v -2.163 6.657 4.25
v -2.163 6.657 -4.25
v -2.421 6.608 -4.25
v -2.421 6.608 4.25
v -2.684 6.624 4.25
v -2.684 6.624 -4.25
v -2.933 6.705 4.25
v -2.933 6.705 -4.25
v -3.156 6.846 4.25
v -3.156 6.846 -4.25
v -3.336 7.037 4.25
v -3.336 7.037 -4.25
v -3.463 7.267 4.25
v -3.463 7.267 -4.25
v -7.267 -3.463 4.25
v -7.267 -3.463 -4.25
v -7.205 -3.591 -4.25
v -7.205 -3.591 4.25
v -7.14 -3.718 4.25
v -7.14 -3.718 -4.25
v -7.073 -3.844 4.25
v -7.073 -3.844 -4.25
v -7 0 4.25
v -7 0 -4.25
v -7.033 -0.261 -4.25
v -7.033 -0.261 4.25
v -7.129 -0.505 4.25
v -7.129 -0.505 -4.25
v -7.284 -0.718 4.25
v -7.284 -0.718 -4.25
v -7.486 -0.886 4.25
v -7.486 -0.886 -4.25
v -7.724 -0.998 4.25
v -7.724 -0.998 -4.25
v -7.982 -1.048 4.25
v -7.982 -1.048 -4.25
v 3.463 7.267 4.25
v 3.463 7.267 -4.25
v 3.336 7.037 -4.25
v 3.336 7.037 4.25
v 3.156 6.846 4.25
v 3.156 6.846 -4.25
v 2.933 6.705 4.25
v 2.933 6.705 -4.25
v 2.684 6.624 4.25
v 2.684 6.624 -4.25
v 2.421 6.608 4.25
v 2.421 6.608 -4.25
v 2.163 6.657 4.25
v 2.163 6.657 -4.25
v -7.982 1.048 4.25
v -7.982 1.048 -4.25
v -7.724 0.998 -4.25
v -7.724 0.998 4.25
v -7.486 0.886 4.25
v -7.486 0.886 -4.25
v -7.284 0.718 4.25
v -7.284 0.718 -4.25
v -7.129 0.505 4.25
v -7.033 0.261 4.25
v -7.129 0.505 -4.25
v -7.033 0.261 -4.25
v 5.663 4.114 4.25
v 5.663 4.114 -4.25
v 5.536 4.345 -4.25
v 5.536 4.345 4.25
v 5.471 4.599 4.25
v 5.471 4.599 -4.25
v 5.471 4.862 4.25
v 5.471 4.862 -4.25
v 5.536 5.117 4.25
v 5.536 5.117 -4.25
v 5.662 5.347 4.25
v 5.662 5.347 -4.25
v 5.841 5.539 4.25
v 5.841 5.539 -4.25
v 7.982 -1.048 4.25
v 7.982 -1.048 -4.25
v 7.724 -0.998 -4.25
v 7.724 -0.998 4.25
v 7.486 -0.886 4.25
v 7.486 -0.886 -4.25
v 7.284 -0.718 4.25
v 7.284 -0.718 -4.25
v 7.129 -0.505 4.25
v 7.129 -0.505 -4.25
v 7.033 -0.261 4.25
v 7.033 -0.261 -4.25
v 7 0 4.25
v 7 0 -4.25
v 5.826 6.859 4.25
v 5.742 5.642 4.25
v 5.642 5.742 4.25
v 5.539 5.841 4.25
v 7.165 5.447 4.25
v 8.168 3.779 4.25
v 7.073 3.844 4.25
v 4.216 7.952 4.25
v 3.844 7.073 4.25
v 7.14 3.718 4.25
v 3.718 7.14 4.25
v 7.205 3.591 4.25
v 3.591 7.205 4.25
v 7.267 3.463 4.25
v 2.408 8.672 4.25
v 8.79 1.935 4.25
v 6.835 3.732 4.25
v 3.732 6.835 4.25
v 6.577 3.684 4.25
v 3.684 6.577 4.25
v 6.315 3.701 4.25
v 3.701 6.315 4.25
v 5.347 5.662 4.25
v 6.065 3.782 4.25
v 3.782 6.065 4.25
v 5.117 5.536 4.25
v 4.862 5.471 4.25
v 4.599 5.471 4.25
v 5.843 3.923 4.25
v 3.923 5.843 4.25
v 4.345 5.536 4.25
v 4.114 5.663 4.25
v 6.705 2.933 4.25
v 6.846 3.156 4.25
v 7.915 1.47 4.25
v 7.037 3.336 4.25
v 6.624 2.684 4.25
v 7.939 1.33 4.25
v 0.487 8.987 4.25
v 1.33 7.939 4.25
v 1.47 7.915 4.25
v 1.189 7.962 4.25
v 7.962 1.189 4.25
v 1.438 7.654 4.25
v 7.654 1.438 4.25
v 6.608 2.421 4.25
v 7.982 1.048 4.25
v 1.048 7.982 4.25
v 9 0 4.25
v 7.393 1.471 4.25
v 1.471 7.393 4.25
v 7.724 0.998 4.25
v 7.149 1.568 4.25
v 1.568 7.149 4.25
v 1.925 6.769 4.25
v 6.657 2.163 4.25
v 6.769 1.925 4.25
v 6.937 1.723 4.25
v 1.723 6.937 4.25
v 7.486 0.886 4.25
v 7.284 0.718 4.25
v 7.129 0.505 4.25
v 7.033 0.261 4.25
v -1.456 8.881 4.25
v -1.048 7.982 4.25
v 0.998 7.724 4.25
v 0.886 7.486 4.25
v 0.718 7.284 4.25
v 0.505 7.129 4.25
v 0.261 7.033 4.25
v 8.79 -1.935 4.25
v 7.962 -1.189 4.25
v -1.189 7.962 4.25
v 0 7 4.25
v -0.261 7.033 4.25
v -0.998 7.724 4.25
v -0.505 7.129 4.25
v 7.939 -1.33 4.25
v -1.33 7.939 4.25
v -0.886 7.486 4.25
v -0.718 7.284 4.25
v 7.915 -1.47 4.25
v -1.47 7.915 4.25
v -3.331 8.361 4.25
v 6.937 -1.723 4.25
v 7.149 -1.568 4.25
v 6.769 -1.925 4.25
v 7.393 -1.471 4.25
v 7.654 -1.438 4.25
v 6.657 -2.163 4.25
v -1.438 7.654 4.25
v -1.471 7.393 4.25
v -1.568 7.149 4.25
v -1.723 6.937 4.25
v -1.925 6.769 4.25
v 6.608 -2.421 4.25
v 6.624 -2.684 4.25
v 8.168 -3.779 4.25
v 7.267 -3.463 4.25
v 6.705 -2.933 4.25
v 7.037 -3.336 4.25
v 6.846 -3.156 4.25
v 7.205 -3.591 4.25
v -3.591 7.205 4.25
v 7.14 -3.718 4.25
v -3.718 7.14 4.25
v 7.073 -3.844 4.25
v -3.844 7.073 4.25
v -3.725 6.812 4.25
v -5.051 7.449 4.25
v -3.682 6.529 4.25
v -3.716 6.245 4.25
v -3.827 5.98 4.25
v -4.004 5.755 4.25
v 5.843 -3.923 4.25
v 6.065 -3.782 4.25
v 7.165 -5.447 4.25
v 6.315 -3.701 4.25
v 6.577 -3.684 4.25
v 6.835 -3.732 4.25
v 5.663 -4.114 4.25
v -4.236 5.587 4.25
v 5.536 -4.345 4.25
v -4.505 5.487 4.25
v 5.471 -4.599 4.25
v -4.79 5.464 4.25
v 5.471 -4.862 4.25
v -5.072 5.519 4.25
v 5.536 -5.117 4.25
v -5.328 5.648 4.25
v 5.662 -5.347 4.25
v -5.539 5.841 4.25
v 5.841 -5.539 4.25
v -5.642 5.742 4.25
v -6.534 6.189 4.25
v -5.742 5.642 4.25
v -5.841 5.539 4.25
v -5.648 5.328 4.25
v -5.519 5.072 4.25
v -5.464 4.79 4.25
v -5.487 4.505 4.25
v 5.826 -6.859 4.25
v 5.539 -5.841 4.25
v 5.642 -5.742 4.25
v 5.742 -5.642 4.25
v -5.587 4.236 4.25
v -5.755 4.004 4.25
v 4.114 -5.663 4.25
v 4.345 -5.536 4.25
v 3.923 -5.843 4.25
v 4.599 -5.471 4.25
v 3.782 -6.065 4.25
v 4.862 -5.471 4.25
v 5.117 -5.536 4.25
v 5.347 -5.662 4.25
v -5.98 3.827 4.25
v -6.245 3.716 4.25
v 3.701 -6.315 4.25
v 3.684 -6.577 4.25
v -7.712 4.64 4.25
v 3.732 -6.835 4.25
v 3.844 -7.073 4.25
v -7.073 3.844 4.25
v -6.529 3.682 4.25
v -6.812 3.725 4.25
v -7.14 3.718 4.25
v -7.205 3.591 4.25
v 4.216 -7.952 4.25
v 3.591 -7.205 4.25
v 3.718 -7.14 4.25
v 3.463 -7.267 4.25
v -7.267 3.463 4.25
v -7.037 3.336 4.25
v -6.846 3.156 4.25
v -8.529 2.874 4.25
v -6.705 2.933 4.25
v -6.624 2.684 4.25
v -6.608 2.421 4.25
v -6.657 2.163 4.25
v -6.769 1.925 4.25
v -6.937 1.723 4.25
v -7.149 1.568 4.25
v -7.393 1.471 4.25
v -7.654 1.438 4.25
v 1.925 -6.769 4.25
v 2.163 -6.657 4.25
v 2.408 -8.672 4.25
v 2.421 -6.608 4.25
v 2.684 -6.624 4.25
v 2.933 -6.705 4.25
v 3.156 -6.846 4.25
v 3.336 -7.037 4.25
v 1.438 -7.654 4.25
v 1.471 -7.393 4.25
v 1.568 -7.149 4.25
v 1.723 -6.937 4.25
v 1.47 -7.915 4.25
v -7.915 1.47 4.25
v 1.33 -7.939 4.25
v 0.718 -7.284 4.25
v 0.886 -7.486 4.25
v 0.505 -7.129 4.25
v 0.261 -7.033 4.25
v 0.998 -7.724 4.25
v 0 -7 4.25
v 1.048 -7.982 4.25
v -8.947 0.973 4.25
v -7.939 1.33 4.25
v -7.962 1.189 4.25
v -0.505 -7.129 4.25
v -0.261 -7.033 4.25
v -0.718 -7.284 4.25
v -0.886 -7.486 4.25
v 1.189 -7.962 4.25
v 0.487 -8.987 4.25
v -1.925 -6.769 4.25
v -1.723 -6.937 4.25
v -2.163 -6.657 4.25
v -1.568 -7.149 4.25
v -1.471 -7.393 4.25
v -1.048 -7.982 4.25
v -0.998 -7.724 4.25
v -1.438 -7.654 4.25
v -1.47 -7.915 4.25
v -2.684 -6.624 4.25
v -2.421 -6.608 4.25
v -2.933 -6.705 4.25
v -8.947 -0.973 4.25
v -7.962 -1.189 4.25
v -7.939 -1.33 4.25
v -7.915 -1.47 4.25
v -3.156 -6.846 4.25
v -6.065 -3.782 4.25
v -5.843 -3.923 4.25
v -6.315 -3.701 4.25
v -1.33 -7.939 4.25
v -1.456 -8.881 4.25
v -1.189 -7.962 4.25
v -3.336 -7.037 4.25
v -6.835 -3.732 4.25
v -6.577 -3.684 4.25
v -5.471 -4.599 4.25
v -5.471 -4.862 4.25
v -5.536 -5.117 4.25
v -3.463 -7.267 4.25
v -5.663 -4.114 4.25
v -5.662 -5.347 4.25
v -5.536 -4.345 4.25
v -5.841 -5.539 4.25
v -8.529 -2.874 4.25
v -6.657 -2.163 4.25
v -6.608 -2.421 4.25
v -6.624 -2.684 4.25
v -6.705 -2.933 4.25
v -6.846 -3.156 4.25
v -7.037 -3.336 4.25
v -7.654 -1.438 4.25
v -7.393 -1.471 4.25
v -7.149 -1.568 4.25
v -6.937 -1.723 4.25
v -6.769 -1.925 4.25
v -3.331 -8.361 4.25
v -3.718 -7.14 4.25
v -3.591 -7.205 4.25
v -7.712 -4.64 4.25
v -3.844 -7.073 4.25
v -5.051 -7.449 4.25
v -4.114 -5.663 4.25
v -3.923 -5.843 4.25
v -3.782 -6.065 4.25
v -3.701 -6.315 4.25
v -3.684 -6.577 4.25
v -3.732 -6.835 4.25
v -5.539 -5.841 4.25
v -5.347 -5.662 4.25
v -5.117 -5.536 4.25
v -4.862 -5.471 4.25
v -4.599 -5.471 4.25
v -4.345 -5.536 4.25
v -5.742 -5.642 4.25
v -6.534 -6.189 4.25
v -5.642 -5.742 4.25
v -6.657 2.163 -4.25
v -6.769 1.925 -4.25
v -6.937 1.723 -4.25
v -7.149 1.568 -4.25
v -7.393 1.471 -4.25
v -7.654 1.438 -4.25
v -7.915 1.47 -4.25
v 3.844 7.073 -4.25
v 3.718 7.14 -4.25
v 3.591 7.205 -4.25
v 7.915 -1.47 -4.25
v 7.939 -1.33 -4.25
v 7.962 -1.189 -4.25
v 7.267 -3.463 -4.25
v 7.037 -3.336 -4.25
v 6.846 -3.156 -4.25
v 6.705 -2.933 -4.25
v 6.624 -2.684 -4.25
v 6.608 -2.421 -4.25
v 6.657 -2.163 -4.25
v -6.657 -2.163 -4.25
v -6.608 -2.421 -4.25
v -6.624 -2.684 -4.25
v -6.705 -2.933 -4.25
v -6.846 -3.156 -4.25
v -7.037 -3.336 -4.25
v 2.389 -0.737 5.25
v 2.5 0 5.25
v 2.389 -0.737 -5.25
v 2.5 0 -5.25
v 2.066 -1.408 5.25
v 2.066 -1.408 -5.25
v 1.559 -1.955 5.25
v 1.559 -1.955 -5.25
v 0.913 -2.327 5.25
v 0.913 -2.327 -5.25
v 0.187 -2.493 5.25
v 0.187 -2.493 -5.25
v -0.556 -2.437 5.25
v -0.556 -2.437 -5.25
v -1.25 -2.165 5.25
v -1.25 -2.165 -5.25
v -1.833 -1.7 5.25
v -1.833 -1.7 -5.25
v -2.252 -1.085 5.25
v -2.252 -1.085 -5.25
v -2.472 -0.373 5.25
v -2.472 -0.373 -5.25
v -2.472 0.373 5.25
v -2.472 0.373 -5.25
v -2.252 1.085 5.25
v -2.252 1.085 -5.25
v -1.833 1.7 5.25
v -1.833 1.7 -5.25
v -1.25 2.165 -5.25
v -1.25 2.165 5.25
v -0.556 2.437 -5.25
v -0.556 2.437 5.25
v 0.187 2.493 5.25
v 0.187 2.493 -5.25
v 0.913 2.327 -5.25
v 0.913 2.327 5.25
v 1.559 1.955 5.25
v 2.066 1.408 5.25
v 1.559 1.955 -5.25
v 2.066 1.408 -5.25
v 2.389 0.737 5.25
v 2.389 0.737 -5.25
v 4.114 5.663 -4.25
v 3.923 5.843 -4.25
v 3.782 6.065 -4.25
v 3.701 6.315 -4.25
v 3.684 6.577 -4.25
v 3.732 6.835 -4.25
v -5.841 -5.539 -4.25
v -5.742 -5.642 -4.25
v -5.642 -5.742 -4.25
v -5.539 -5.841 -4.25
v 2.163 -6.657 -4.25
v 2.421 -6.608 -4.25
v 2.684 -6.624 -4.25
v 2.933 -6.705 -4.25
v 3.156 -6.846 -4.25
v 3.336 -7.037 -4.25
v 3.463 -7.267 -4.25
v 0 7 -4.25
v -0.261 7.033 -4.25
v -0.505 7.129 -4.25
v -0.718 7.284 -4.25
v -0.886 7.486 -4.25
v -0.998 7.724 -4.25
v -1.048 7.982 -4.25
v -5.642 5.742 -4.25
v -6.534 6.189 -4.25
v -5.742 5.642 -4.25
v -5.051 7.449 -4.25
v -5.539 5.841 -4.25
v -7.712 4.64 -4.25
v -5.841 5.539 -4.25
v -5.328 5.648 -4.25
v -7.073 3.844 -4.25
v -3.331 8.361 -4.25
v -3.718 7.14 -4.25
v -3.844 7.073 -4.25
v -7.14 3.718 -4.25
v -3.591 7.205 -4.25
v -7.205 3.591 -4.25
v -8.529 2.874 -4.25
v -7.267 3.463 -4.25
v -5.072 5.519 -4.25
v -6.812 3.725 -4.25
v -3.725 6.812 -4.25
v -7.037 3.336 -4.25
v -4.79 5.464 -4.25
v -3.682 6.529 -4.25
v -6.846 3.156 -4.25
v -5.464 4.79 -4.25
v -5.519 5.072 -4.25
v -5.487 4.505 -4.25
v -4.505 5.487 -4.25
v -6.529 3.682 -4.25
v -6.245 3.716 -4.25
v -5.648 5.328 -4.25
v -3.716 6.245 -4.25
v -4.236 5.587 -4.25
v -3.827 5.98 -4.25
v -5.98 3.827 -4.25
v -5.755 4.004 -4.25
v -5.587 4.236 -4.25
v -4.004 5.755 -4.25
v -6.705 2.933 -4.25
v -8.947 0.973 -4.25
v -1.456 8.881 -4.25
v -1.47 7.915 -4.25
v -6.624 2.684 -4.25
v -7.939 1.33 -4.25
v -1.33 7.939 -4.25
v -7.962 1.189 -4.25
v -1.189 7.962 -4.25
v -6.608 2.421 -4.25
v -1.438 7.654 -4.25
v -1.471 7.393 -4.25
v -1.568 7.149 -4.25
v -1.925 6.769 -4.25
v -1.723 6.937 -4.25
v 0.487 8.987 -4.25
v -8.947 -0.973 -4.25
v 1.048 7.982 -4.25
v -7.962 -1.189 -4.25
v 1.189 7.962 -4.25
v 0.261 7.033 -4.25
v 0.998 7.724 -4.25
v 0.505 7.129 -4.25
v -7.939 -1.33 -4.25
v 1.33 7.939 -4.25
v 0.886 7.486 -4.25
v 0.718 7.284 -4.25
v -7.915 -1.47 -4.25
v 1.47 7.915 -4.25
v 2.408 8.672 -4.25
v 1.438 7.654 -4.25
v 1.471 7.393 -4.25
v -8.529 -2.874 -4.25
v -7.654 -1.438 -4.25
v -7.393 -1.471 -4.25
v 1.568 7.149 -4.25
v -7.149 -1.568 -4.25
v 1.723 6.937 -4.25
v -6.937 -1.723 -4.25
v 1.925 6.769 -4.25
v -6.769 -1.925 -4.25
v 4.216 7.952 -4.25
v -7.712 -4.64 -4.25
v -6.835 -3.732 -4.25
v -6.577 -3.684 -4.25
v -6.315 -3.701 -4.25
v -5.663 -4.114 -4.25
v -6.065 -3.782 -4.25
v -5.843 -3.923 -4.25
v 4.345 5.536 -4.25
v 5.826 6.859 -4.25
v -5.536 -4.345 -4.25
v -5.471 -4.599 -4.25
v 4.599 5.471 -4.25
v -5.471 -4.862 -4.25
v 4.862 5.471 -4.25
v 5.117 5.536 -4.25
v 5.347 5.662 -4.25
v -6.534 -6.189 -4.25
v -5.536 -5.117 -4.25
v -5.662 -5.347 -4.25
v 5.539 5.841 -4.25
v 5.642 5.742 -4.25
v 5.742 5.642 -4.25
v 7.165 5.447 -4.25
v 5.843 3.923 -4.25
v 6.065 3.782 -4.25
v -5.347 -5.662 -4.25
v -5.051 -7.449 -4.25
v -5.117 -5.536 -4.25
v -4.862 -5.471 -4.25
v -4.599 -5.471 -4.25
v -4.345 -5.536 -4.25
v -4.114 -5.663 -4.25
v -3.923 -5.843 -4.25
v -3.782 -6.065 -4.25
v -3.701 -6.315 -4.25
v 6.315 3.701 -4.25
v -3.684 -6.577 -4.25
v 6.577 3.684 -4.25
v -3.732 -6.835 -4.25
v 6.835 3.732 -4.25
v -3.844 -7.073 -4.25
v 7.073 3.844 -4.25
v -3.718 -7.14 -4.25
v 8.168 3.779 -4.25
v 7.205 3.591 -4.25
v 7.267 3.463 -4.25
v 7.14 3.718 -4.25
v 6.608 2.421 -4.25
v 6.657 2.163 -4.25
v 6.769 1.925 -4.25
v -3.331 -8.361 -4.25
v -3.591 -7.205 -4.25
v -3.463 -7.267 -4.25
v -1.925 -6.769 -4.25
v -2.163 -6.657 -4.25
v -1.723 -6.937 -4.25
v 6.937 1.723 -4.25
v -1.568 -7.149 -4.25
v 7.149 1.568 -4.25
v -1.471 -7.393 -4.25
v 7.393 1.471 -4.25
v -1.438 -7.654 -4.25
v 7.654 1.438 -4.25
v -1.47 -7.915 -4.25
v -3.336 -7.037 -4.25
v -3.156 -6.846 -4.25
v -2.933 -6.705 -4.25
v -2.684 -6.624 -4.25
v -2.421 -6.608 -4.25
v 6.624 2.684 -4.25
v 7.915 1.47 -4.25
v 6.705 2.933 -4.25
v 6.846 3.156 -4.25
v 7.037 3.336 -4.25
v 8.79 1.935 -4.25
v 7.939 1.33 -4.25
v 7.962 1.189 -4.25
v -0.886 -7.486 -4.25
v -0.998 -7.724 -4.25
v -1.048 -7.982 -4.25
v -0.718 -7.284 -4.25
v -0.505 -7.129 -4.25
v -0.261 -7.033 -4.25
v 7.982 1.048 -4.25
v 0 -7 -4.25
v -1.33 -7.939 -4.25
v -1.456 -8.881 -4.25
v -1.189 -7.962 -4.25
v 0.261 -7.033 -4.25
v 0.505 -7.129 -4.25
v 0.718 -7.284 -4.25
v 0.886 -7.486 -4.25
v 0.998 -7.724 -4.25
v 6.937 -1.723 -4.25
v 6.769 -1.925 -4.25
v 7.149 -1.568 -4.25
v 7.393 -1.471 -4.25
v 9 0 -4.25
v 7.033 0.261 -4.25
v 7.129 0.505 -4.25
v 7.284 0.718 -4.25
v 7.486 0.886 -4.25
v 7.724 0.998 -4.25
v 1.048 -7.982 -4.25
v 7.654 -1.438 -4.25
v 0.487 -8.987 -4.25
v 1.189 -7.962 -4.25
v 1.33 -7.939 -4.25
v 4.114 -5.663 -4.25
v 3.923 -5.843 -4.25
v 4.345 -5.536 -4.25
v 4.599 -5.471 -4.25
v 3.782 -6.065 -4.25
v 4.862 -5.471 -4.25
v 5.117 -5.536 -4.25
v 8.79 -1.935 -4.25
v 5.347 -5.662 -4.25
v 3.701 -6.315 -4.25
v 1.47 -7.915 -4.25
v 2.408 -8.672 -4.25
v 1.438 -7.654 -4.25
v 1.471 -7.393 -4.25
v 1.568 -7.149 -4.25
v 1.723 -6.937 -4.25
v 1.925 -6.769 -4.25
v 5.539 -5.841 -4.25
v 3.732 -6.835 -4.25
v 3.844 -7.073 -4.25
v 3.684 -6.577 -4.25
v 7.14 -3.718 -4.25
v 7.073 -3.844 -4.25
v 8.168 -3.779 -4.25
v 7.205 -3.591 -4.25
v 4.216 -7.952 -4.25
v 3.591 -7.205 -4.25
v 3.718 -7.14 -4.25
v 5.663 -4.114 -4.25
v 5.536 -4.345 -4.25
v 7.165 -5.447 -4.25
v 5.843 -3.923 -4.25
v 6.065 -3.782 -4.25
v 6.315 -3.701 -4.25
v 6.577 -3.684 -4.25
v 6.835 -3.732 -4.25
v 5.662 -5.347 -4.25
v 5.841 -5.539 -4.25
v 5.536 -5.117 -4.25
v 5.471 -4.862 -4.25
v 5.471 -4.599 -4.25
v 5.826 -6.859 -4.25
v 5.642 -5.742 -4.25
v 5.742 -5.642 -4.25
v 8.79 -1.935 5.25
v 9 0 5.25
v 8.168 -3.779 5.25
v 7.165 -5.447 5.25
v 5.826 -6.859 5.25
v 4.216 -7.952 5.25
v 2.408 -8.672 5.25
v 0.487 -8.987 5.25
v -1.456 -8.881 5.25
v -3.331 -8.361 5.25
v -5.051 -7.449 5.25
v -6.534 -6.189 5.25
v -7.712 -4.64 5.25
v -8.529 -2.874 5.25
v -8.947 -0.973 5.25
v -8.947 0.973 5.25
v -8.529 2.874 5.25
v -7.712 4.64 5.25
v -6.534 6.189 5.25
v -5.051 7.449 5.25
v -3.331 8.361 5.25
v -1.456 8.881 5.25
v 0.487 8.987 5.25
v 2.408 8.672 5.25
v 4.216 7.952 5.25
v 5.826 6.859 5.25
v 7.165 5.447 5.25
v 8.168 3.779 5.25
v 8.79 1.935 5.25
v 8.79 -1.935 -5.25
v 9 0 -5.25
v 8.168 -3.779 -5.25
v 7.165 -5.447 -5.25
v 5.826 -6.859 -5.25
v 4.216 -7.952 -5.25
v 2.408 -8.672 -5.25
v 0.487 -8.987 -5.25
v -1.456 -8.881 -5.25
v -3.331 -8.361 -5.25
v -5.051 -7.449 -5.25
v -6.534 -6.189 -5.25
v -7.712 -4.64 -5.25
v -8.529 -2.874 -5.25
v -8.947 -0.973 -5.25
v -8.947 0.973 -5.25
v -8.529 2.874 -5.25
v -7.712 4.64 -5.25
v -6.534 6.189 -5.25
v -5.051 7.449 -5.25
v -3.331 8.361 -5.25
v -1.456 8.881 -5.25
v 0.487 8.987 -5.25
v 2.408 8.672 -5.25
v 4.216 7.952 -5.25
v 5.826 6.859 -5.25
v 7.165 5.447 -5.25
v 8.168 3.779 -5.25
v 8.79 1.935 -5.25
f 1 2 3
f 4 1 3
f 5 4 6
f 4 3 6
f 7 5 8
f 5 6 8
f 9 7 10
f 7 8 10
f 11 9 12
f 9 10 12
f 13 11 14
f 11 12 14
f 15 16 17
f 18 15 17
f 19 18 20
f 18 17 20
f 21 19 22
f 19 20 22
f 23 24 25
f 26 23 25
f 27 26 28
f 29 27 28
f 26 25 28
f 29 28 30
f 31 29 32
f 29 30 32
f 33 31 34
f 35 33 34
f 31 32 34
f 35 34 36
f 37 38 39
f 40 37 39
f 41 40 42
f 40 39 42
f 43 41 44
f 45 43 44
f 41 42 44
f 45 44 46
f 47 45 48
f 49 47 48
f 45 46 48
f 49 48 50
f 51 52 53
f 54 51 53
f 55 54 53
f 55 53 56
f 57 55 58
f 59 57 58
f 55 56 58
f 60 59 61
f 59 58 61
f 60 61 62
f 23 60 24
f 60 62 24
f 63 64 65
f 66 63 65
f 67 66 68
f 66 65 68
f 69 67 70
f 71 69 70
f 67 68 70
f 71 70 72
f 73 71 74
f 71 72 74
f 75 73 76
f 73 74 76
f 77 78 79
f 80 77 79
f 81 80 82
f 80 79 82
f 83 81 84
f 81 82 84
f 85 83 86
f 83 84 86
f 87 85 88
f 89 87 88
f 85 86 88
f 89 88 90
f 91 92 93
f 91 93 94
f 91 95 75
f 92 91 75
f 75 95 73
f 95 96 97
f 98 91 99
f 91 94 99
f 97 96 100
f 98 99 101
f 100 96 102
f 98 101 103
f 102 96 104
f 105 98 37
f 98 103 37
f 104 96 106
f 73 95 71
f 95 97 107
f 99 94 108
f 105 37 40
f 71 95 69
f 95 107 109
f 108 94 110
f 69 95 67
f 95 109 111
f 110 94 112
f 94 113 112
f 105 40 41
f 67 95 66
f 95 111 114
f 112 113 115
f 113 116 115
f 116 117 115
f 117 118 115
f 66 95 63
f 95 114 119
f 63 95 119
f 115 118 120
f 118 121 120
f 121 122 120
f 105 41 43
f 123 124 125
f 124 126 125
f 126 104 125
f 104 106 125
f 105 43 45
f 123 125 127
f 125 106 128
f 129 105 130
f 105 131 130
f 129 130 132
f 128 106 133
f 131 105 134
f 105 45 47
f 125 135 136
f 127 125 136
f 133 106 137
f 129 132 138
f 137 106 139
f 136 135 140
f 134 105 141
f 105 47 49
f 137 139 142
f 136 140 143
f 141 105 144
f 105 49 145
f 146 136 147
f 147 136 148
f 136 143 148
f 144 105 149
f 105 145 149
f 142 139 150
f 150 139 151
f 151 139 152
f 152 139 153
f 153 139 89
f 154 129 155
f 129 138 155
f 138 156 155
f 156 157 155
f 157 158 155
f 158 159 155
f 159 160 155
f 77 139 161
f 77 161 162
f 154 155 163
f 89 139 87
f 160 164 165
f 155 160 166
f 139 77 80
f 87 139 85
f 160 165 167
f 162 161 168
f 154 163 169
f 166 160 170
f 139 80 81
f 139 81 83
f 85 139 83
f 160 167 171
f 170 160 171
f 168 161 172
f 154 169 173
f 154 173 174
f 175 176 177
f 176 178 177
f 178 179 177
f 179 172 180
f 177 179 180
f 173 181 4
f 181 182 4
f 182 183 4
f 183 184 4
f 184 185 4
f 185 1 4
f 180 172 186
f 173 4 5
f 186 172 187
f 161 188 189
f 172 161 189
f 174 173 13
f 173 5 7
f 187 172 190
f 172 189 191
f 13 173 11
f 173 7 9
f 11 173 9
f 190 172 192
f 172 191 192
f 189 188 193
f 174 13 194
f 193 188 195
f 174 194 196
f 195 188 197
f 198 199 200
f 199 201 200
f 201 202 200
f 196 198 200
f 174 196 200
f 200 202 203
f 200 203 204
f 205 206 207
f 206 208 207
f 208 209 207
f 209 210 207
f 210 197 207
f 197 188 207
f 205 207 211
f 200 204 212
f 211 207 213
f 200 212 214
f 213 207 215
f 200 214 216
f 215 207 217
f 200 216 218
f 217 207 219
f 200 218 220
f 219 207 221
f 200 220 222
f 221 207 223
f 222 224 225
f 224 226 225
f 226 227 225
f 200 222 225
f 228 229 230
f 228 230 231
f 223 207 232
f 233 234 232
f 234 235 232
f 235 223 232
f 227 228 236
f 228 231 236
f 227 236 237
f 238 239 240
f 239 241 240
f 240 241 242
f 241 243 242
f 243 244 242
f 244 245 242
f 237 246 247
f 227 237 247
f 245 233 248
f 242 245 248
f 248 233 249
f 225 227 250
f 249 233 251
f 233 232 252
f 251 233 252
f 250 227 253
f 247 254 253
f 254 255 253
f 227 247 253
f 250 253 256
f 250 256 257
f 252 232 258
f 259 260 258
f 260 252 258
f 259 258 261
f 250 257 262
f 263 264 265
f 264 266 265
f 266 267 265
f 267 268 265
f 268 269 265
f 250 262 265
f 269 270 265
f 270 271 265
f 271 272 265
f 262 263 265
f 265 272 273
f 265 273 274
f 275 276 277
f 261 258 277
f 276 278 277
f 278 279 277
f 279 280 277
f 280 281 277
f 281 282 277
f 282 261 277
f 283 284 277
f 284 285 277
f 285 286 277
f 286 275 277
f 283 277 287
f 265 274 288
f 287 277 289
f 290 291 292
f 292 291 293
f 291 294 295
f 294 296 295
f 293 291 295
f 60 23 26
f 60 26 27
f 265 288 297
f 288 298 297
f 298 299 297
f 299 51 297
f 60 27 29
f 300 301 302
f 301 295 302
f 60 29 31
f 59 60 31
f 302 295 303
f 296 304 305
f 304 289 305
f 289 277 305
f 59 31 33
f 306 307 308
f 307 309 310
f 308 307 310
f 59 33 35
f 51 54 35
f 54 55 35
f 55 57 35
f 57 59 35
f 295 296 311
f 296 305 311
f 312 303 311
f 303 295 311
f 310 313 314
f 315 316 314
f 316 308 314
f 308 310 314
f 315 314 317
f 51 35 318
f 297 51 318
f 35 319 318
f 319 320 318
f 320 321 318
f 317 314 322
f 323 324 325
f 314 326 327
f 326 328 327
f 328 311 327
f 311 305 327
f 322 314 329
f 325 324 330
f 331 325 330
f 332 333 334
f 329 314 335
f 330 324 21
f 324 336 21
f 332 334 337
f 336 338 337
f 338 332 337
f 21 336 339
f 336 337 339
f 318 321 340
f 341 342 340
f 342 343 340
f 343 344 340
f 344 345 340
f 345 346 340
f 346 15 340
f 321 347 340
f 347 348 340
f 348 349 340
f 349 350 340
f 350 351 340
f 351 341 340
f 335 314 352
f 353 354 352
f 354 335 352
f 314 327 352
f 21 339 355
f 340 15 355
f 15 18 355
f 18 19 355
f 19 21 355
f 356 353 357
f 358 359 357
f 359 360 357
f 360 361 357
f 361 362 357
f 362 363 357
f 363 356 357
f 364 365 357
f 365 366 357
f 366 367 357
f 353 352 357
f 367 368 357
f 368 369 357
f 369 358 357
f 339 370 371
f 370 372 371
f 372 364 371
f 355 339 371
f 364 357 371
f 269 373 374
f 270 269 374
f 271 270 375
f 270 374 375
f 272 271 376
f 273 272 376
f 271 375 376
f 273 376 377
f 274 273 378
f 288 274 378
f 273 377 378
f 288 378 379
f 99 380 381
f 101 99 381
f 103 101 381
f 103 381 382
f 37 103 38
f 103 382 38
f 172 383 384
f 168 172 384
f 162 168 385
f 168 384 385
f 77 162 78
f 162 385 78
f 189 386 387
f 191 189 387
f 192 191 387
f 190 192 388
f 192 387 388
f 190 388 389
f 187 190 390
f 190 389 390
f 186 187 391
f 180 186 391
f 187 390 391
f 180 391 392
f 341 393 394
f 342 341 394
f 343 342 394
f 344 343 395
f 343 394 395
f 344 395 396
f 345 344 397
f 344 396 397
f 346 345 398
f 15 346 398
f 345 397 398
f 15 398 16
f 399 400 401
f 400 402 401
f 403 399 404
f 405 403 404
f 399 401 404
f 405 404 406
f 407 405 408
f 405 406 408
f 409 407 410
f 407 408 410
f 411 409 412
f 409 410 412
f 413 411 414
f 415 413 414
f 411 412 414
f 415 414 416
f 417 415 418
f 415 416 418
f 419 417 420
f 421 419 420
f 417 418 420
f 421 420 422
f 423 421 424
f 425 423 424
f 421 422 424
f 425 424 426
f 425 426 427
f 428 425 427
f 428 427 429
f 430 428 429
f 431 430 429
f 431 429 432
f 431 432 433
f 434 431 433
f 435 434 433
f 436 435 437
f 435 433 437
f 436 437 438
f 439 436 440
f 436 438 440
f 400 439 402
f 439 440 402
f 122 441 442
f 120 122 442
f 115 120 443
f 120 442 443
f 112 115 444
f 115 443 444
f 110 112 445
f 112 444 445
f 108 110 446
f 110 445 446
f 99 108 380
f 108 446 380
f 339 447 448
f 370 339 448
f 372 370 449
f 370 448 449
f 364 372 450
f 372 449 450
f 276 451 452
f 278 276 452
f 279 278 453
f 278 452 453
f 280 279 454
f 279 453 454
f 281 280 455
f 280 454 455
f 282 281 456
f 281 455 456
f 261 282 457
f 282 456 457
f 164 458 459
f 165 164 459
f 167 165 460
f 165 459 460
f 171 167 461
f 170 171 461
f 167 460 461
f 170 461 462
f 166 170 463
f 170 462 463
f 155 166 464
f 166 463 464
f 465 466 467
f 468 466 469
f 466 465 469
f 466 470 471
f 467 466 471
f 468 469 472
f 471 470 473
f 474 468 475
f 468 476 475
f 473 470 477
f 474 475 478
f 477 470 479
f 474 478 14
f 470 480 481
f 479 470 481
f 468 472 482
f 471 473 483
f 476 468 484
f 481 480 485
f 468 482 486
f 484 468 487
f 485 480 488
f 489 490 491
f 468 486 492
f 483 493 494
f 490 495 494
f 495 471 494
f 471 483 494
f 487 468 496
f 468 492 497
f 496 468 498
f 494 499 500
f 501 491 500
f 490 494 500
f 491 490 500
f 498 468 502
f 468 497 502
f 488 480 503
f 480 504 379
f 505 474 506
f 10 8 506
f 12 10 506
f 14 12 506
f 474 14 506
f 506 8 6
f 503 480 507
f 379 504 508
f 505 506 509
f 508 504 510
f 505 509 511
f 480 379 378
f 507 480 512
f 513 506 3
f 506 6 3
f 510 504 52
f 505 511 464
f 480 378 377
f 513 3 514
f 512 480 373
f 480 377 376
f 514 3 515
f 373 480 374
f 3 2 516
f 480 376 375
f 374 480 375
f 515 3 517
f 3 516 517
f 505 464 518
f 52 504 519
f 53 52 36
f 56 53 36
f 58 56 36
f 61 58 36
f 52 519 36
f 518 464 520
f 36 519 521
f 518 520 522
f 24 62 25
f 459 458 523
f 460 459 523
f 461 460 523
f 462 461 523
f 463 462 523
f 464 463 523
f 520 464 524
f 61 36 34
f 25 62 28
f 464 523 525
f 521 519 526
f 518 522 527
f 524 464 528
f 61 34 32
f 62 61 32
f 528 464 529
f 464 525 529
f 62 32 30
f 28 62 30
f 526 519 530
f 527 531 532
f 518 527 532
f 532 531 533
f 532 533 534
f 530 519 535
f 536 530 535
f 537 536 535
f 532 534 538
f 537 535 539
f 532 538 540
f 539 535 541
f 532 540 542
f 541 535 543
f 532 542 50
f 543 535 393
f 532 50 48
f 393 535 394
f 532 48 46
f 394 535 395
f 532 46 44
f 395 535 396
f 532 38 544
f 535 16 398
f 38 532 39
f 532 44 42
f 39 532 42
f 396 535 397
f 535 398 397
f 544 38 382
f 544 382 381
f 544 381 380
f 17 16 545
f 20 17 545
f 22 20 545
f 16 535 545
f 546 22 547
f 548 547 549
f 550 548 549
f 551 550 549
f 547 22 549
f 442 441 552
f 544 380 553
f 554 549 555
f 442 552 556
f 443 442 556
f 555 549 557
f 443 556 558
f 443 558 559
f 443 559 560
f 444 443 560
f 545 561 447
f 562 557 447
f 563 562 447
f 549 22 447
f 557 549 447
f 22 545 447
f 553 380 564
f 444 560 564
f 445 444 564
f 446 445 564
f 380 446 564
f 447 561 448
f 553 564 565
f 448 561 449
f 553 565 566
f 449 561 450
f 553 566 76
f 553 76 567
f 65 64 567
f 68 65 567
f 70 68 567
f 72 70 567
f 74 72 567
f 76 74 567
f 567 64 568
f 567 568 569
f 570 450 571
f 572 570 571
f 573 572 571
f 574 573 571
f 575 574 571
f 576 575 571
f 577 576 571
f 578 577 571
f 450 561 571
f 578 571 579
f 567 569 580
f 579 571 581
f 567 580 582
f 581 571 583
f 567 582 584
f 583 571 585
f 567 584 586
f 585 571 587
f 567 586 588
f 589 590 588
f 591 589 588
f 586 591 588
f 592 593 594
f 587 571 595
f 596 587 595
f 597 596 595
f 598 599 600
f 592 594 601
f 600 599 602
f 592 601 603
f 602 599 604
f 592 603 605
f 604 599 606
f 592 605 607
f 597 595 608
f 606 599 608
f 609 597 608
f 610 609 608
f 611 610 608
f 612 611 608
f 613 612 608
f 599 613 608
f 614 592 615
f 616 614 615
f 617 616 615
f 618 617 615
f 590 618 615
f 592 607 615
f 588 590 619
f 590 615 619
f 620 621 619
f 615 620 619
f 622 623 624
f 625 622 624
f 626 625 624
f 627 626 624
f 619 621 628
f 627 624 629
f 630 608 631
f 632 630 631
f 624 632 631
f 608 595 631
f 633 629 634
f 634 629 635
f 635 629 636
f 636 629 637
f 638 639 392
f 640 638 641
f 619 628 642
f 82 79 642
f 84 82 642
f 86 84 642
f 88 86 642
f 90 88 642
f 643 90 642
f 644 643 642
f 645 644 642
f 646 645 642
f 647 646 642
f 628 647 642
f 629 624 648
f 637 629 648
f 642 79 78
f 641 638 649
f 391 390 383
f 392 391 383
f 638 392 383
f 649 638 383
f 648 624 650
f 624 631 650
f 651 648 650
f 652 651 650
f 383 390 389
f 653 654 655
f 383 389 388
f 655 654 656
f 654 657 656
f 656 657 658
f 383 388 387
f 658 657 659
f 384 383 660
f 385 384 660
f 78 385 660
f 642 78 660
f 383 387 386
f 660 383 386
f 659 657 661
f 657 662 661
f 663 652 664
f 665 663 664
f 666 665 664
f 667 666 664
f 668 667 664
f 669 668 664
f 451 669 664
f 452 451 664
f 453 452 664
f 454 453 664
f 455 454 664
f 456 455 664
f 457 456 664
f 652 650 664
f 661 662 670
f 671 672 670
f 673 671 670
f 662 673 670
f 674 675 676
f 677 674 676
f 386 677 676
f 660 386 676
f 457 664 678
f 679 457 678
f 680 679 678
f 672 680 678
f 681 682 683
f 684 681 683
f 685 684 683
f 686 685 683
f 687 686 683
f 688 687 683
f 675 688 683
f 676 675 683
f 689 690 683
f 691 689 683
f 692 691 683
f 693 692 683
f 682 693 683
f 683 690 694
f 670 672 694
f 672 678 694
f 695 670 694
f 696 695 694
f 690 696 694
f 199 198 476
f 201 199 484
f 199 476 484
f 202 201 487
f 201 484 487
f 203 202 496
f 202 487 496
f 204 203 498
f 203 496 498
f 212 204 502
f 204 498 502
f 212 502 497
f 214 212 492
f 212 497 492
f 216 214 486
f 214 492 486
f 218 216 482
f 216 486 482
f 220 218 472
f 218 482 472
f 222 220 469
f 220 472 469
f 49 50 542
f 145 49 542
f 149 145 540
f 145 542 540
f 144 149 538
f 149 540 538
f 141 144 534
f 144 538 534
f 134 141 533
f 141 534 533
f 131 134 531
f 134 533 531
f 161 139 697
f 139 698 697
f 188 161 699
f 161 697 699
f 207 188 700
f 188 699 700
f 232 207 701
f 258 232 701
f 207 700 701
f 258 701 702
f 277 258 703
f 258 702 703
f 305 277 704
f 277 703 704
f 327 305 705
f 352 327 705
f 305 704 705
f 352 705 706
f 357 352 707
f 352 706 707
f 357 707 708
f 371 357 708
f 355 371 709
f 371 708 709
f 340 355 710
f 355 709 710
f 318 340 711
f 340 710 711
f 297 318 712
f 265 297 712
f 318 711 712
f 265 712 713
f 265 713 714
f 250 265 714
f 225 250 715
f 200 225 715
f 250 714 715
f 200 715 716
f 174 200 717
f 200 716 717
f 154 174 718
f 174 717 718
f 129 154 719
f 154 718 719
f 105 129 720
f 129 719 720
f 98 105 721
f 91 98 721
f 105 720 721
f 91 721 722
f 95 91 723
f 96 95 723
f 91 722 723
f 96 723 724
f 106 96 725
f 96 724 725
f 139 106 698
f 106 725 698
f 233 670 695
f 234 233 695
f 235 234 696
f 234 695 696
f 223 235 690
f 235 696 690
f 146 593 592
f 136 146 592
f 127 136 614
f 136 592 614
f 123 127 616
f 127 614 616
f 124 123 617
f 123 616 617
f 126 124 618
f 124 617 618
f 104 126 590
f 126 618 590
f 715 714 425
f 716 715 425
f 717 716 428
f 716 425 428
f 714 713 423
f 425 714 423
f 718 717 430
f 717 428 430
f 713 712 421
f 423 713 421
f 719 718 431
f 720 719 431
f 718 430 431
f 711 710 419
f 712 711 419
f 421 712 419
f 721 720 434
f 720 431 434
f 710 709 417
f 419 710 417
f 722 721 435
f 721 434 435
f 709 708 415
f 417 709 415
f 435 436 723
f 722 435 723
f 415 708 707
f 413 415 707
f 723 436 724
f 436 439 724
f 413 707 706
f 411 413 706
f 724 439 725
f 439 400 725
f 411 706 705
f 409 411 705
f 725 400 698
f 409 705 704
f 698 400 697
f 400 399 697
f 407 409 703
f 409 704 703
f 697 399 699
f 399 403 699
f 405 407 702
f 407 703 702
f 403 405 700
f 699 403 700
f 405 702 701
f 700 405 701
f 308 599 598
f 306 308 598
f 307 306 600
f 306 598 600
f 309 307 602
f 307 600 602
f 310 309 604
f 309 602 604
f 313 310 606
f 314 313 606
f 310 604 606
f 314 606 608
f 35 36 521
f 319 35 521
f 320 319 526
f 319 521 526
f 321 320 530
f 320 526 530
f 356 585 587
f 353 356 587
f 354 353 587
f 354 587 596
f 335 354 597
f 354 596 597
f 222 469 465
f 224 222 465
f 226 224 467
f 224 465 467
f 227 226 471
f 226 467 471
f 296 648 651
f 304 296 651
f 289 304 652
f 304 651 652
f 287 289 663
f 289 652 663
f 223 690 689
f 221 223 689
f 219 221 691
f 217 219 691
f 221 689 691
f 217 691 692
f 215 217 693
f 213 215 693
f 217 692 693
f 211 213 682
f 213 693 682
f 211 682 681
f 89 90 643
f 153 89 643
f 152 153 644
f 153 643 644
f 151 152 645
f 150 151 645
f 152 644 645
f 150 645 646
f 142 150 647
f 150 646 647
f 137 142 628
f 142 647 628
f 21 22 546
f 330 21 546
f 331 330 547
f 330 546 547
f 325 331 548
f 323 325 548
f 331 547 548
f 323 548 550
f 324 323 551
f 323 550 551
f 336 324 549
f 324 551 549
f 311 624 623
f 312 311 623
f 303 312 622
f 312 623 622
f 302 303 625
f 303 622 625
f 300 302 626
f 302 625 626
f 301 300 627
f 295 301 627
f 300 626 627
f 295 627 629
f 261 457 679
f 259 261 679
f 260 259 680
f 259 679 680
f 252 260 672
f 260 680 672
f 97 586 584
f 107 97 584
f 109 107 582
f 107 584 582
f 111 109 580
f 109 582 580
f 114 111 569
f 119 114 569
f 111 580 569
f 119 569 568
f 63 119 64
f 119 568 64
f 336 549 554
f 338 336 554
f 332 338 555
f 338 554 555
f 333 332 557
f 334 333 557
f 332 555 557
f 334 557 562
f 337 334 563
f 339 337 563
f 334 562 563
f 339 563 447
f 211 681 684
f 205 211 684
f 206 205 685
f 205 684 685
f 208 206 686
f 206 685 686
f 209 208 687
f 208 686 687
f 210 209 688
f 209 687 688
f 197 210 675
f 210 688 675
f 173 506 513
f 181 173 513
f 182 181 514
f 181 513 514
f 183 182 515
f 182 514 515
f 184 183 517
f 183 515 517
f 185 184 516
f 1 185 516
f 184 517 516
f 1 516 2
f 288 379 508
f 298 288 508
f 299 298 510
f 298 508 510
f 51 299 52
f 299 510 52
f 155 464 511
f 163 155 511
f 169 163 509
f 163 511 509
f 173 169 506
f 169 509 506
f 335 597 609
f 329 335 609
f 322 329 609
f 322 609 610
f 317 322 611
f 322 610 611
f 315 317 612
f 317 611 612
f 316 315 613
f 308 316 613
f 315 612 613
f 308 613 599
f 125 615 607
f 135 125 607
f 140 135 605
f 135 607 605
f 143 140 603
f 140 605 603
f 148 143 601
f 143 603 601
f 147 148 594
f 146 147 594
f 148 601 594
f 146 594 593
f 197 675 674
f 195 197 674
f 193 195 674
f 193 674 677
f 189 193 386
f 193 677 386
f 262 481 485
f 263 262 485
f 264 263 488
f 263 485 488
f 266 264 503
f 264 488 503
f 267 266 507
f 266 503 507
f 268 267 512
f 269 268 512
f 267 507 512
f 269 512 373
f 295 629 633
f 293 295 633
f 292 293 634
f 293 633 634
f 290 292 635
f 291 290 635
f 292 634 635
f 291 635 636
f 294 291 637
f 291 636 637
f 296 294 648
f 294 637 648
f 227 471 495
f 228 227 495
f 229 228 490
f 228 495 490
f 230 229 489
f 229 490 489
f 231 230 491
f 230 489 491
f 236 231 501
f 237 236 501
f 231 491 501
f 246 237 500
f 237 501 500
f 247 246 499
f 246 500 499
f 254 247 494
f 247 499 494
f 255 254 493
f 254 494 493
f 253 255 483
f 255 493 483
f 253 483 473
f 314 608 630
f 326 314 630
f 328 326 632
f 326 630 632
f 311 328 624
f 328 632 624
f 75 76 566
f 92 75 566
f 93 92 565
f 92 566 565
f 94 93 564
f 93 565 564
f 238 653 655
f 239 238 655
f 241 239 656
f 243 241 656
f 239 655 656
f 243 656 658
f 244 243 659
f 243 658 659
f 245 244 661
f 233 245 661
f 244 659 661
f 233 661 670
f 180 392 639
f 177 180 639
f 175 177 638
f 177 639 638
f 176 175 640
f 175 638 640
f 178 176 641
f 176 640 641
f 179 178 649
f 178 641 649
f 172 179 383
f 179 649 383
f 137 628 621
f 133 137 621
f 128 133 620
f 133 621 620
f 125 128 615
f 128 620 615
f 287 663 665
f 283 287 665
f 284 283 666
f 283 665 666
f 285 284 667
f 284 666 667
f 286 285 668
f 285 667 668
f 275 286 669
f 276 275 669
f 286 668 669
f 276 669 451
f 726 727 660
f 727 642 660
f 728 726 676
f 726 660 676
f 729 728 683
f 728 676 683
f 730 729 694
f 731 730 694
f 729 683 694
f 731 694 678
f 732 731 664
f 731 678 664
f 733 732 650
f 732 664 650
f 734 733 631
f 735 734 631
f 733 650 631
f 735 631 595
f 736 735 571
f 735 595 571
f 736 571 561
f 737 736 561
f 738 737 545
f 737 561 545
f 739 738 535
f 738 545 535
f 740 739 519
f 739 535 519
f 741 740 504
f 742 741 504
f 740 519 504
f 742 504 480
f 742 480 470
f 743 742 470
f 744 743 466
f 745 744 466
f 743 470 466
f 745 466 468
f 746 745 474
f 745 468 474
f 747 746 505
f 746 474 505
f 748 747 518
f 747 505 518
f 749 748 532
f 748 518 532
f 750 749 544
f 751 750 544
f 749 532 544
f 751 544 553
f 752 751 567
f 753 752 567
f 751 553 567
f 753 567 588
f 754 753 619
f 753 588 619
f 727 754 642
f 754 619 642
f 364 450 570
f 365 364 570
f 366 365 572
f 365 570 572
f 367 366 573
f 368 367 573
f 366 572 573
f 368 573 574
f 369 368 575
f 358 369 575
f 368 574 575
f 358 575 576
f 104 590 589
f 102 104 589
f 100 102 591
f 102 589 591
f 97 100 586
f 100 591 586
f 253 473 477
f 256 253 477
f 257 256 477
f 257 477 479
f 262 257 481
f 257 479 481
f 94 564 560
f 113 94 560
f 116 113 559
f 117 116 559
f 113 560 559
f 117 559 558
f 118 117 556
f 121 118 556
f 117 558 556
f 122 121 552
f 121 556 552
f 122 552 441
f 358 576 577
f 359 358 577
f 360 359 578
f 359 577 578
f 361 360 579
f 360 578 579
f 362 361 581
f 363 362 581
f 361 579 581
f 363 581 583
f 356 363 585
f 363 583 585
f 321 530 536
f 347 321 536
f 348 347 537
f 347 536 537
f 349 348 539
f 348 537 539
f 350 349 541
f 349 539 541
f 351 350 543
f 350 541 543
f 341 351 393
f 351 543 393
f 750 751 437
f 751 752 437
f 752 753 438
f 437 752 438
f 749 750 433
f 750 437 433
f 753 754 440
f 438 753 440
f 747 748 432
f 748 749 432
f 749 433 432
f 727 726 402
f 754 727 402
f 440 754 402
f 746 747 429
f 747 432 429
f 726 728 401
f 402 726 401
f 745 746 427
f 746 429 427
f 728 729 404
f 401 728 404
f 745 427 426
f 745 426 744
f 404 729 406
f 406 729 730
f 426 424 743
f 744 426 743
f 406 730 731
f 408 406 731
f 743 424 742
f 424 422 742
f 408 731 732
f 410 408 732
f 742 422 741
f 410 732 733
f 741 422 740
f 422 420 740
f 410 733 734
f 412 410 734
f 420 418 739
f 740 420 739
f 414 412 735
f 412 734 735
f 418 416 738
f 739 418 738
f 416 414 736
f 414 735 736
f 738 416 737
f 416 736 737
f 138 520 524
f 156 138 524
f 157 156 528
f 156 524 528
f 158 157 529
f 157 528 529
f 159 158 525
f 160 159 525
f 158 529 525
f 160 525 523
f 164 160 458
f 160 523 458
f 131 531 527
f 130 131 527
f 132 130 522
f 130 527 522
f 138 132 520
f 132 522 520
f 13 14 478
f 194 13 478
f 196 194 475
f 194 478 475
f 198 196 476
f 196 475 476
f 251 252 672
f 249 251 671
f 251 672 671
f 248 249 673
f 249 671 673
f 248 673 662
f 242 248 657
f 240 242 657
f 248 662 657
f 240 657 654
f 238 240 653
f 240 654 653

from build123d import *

# Parameters (mm, degrees)
F3_DEPTH = 8.5


with BuildPart() as f1:
    # F0 (on Front) → F1 (revolve)
    with BuildSketch(Plane.XZ):
        Polygon((9, 5.25), (2.5, 5.25), (2.5, -5.25), (9, -5.25), (9, -4.25), (7, -4.25), (7, 4.25), (9, 4.25), align=None)
    revolve(axis=Axis((0, 0, -3.0081442633), (0, 0, -1)))

    # F2 (on face) → F3 (join)
    with BuildSketch(Plane.XY.offset(-4.25)):
        with BuildLine():
            ThreePointArc((7.267101182, -3.4629092409), (6.7053936496, -2.9334995134), (6.657395615, -2.1631189579))
            ThreePointArc((6.657395615, -2.1631189579), (6.2370456655, -3.1779335057), (5.663118949, -4.114496782))
            ThreePointArc((5.663118949, -4.114496782), (6.3145824491, -3.7005096665), (7.0730473275, -3.8437613743))
            ThreePointArc((7.0730473275, -3.8437613743), (7.1726025197, -3.6546235229), (7.267101182, -3.4629092409))
        make_face()
        with BuildLine():
            ThreePointArc((7.9815217391, -1.0477646338), (7.2837095283, -0.7178432371), (7, 0))
            ThreePointArc((7, 0), (6.9138183844, -1.0950412539), (6.657395615, -2.1631189579))
            ThreePointArc((6.657395615, -2.1631189579), (7.1490451706, -1.5680805373), (7.9146553379, -1.4699424759))
            ThreePointArc((7.9146553379, -1.4699424759), (7.9508911418, -1.2592974436), (7.9815217391, -1.0477646338))
        make_face()
        with BuildLine():
            ThreePointArc((7.9146553379, 1.4699424759), (7.1490451776, 1.5680805334), (6.6573956199, 2.1631189425))
            ThreePointArc((6.6573956199, 2.1631189425), (6.9138183857, 1.0950412459), (7, 0))
            ThreePointArc((7, 0), (7.2837095283, 0.7178432371), (7.9815217391, 1.0477646338))
            ThreePointArc((7.9815217391, 1.0477646338), (7.9508911418, 1.2592974436), (7.9146553379, 1.4699424759))
        make_face()
        with BuildLine():
            ThreePointArc((5.8413261283, -5.5390801639), (5.4707071235, -4.8620044306), (5.663118949, -4.114496782))
            ThreePointArc((5.663118949, -4.114496782), (4.9497474683, -4.9497474683), (4.114496782, -5.663118949))
            ThreePointArc((4.114496782, -5.663118949), (4.8620044306, -5.4707071235), (5.5390801639, -5.8413261283))
            ThreePointArc((5.5390801639, -5.8413261283), (5.6922095886, -5.6922095886), (5.8413261283, -5.5390801639))
        make_face()
        with BuildLine():
            ThreePointArc((3.8437613743, -7.0730473275), (3.7005096665, -6.3145824491), (4.114496782, -5.663118949))
            ThreePointArc((4.114496782, -5.663118949), (3.1779334985, -6.2370456692), (2.1631189425, -6.6573956199))
            ThreePointArc((2.1631189425, -6.6573956199), (2.933499506, -6.7053936461), (3.4629092409, -7.267101182))
            ThreePointArc((3.4629092409, -7.267101182), (3.6546235229, -7.1726025197), (3.8437613743, -7.0730473275))
        make_face()
        with BuildLine():
            ThreePointArc((1.4699424759, -7.9146553379), (1.5680805334, -7.1490451776), (2.1631189425, -6.6573956199))
            ThreePointArc((2.1631189425, -6.6573956199), (1.0950412459, -6.9138183857), (0, -7))
            ThreePointArc((0, -7), (0.7178432371, -7.2837095283), (1.0477646338, -7.9815217391))
            ThreePointArc((1.0477646338, -7.9815217391), (1.2592974436, -7.9508911418), (1.4699424759, -7.9146553379))
        make_face()
        with BuildLine():
            ThreePointArc((0, -7), (-1.0950412668, -6.9138183823), (-2.1631189827, -6.6573956069))
            ThreePointArc((-2.1631189827, -6.6573956069), (-1.5680805436, -7.1490451591), (-1.4699424759, -7.9146553379))
            ThreePointArc((-1.4699424759, -7.9146553379), (-1.2592974436, -7.9508911418), (-1.0477646338, -7.9815217391))
            ThreePointArc((-1.0477646338, -7.9815217391), (-0.7178432371, -7.2837095283), (0, -7))
        make_face()
        with BuildLine():
            ThreePointArc((-2.1631189827, -6.6573956069), (-3.1779335128, -6.2370456619), (-4.1144967738, -5.663118955))
            ThreePointArc((-4.1144967738, -5.663118955), (-3.7005096655, -6.314582454), (-3.8437613743, -7.0730473275))
            ThreePointArc((-3.8437613743, -7.0730473275), (-3.6546235229, -7.1726025197), (-3.4629092409, -7.267101182))
            ThreePointArc((-3.4629092409, -7.267101182), (-2.9334995252, -6.7053936551), (-2.1631189827, -6.6573956069))
        make_face()
        with BuildLine():
            ThreePointArc((-4.1144967738, -5.663118955), (-4.9497474777, -4.9497474589), (-5.6631189706, -4.1144967523))
            ThreePointArc((-5.6631189706, -4.1144967523), (-5.4707071212, -4.8620044124), (-5.8413261283, -5.5390801639))
            ThreePointArc((-5.8413261283, -5.5390801639), (-5.6922095886, -5.6922095886), (-5.5390801639, -5.8413261283))
            ThreePointArc((-5.5390801639, -5.8413261283), (-4.8620044256, -5.4707071229), (-4.1144967738, -5.663118955))
        make_face()
        with BuildLine():
            ThreePointArc((-5.6631189706, -4.1144967523), (-6.2370456738, -3.1779334893), (-6.657395615, -2.1631189579))
            ThreePointArc((-6.657395615, -2.1631189579), (-6.7053936496, -2.9334995134), (-7.267101182, -3.4629092409))
            ThreePointArc((-7.267101182, -3.4629092409), (-7.1726025197, -3.6546235229), (-7.0730473275, -3.8437613743))
            ThreePointArc((-7.0730473275, -3.8437613743), (-6.3145824671, -3.700509663), (-5.6631189706, -4.1144967523))
        make_face()
        with BuildLine():
            ThreePointArc((-6.657395615, -2.1631189579), (-6.9138183853, -1.0950412479), (-7, 1.2e-08))
            ThreePointArc((-7, 1.2e-08), (-7.2837095242, -0.7178432327), (-7.9815217391, -1.0477646338))
            ThreePointArc((-7.9815217391, -1.0477646338), (-7.9508911418, -1.2592974436), (-7.9146553379, -1.4699424759))
            ThreePointArc((-7.9146553379, -1.4699424759), (-7.1490451706, -1.5680805373), (-6.657395615, -2.1631189579))
        make_face()
        with BuildLine():
            ThreePointArc((-7, 1.2e-08), (-6.9138183847, 1.0950412518), (-6.6573956199, 2.1631189425))
            ThreePointArc((-6.6573956199, 2.1631189425), (-7.1490451776, 1.5680805334), (-7.9146553379, 1.4699424759))
            ThreePointArc((-7.9146553379, 1.4699424759), (-7.9508911418, 1.2592974436), (-7.9815217391, 1.0477646338))
            ThreePointArc((-7.9815217391, 1.0477646338), (-7.2837095325, 0.7178432415), (-7, 1.2e-08))
        make_face()
        with BuildLine():
            ThreePointArc((-6.6573956199, 2.1631189425), (-6.2370456751, 3.1779334867), (-5.6631189645, 4.1144967607))
            ThreePointArc((-5.6631189645, 4.1144967607), (-6.314582462, 3.700509664), (-7.0730473275, 3.8437613743))
            ThreePointArc((-7.0730473275, 3.8437613743), (-7.1726025197, 3.6546235229), (-7.267101182, 3.4629092409))
            ThreePointArc((-7.267101182, 3.4629092409), (-6.7053936461, 2.933499506), (-6.6573956199, 2.1631189425))
        make_face()
        with BuildLine():
            ThreePointArc((-5.6631189645, 4.1144967607), (-4.9497474683, 4.9497474683), (-4.1144967607, 5.6631189645))
            ThreePointArc((-4.1144967607, 5.6631189645), (-4.8620044176, 5.4707071219), (-5.5390801639, 5.8413261283))
            ThreePointArc((-5.5390801639, 5.8413261283), (-5.6922095886, 5.6922095886), (-5.8413261283, 5.5390801639))
            ThreePointArc((-5.8413261283, 5.5390801639), (-5.4707071219, 4.8620044176), (-5.6631189645, 4.1144967607))
        make_face()
        with BuildLine():
            ThreePointArc((-4.1144967607, 5.6631189645), (-3.1779334867, 6.2370456751), (-2.1631189425, 6.6573956199))
            ThreePointArc((-2.1631189425, 6.6573956199), (-2.933499506, 6.7053936461), (-3.4629092409, 7.267101182))
            ThreePointArc((-3.4629092409, 7.267101182), (-3.6546235229, 7.1726025197), (-3.8437613743, 7.0730473275))
            ThreePointArc((-3.8437613743, 7.0730473275), (-3.700509664, 6.314582462), (-4.1144967607, 5.6631189645))
        make_face()
        with BuildLine():
            ThreePointArc((-8.7e-09, 7), (-0.7178432403, 7.2837095313), (-1.0477646338, 7.9815217391))
            ThreePointArc((-1.0477646338, 7.9815217391), (-1.2592974436, 7.9508911418), (-1.4699424759, 7.9146553379))
            ThreePointArc((-1.4699424759, 7.9146553379), (-1.5680805334, 7.1490451776), (-2.1631189425, 6.6573956199))
            ThreePointArc((-2.1631189425, 6.6573956199), (-1.0950412502, 6.913818385), (-8.7e-09, 7))
        make_face()
        with BuildLine():
            ThreePointArc((1.0477646338, 7.9815217391), (0.7178432339, 7.2837095254), (-8.7e-09, 7))
            ThreePointArc((-8.7e-09, 7), (1.0950412447, 6.9138183858), (2.1631189486, 6.657395618))
            ThreePointArc((2.1631189486, 6.657395618), (1.568080535, 7.1490451748), (1.4699424759, 7.9146553379))
            ThreePointArc((1.4699424759, 7.9146553379), (1.2592974436, 7.9508911418), (1.0477646338, 7.9815217391))
        make_face()
        with BuildLine():
            ThreePointArc((3.4629092409, 7.267101182), (2.9334995089, 6.7053936475), (2.1631189486, 6.657395618))
            ThreePointArc((2.1631189486, 6.657395618), (3.1779335013, 6.2370456677), (4.114496782, 5.663118949))
            ThreePointArc((4.114496782, 5.663118949), (3.7005096665, 6.3145824491), (3.8437613743, 7.0730473275))
            ThreePointArc((3.8437613743, 7.0730473275), (3.6546235229, 7.1726025197), (3.4629092409, 7.267101182))
        make_face()
        with BuildLine():
            ThreePointArc((5.5390801639, 5.8413261283), (4.8620044306, 5.4707071235), (4.114496782, 5.663118949))
            ThreePointArc((4.114496782, 5.663118949), (4.949747481, 4.9497474556), (5.6631189701, 4.114496753))
            ThreePointArc((5.6631189701, 4.114496753), (5.4707071213, 4.8620044128), (5.8413261283, 5.5390801639))
            ThreePointArc((5.8413261283, 5.5390801639), (5.6922095886, 5.6922095886), (5.5390801639, 5.8413261283))
        make_face()
        with BuildLine():
            ThreePointArc((7.0730473275, 3.8437613743), (6.3145824667, 3.7005096631), (5.6631189701, 4.114496753))
            ThreePointArc((5.6631189701, 4.114496753), (6.2370456773, 3.1779334825), (6.6573956199, 2.1631189425))
            ThreePointArc((6.6573956199, 2.1631189425), (6.7053936461, 2.933499506), (7.267101182, 3.4629092409))
            ThreePointArc((7.267101182, 3.4629092409), (7.1726025197, 3.6546235229), (7.0730473275, 3.8437613743))
        make_face()
    extrude(amount=F3_DEPTH)


solid = f1.part
